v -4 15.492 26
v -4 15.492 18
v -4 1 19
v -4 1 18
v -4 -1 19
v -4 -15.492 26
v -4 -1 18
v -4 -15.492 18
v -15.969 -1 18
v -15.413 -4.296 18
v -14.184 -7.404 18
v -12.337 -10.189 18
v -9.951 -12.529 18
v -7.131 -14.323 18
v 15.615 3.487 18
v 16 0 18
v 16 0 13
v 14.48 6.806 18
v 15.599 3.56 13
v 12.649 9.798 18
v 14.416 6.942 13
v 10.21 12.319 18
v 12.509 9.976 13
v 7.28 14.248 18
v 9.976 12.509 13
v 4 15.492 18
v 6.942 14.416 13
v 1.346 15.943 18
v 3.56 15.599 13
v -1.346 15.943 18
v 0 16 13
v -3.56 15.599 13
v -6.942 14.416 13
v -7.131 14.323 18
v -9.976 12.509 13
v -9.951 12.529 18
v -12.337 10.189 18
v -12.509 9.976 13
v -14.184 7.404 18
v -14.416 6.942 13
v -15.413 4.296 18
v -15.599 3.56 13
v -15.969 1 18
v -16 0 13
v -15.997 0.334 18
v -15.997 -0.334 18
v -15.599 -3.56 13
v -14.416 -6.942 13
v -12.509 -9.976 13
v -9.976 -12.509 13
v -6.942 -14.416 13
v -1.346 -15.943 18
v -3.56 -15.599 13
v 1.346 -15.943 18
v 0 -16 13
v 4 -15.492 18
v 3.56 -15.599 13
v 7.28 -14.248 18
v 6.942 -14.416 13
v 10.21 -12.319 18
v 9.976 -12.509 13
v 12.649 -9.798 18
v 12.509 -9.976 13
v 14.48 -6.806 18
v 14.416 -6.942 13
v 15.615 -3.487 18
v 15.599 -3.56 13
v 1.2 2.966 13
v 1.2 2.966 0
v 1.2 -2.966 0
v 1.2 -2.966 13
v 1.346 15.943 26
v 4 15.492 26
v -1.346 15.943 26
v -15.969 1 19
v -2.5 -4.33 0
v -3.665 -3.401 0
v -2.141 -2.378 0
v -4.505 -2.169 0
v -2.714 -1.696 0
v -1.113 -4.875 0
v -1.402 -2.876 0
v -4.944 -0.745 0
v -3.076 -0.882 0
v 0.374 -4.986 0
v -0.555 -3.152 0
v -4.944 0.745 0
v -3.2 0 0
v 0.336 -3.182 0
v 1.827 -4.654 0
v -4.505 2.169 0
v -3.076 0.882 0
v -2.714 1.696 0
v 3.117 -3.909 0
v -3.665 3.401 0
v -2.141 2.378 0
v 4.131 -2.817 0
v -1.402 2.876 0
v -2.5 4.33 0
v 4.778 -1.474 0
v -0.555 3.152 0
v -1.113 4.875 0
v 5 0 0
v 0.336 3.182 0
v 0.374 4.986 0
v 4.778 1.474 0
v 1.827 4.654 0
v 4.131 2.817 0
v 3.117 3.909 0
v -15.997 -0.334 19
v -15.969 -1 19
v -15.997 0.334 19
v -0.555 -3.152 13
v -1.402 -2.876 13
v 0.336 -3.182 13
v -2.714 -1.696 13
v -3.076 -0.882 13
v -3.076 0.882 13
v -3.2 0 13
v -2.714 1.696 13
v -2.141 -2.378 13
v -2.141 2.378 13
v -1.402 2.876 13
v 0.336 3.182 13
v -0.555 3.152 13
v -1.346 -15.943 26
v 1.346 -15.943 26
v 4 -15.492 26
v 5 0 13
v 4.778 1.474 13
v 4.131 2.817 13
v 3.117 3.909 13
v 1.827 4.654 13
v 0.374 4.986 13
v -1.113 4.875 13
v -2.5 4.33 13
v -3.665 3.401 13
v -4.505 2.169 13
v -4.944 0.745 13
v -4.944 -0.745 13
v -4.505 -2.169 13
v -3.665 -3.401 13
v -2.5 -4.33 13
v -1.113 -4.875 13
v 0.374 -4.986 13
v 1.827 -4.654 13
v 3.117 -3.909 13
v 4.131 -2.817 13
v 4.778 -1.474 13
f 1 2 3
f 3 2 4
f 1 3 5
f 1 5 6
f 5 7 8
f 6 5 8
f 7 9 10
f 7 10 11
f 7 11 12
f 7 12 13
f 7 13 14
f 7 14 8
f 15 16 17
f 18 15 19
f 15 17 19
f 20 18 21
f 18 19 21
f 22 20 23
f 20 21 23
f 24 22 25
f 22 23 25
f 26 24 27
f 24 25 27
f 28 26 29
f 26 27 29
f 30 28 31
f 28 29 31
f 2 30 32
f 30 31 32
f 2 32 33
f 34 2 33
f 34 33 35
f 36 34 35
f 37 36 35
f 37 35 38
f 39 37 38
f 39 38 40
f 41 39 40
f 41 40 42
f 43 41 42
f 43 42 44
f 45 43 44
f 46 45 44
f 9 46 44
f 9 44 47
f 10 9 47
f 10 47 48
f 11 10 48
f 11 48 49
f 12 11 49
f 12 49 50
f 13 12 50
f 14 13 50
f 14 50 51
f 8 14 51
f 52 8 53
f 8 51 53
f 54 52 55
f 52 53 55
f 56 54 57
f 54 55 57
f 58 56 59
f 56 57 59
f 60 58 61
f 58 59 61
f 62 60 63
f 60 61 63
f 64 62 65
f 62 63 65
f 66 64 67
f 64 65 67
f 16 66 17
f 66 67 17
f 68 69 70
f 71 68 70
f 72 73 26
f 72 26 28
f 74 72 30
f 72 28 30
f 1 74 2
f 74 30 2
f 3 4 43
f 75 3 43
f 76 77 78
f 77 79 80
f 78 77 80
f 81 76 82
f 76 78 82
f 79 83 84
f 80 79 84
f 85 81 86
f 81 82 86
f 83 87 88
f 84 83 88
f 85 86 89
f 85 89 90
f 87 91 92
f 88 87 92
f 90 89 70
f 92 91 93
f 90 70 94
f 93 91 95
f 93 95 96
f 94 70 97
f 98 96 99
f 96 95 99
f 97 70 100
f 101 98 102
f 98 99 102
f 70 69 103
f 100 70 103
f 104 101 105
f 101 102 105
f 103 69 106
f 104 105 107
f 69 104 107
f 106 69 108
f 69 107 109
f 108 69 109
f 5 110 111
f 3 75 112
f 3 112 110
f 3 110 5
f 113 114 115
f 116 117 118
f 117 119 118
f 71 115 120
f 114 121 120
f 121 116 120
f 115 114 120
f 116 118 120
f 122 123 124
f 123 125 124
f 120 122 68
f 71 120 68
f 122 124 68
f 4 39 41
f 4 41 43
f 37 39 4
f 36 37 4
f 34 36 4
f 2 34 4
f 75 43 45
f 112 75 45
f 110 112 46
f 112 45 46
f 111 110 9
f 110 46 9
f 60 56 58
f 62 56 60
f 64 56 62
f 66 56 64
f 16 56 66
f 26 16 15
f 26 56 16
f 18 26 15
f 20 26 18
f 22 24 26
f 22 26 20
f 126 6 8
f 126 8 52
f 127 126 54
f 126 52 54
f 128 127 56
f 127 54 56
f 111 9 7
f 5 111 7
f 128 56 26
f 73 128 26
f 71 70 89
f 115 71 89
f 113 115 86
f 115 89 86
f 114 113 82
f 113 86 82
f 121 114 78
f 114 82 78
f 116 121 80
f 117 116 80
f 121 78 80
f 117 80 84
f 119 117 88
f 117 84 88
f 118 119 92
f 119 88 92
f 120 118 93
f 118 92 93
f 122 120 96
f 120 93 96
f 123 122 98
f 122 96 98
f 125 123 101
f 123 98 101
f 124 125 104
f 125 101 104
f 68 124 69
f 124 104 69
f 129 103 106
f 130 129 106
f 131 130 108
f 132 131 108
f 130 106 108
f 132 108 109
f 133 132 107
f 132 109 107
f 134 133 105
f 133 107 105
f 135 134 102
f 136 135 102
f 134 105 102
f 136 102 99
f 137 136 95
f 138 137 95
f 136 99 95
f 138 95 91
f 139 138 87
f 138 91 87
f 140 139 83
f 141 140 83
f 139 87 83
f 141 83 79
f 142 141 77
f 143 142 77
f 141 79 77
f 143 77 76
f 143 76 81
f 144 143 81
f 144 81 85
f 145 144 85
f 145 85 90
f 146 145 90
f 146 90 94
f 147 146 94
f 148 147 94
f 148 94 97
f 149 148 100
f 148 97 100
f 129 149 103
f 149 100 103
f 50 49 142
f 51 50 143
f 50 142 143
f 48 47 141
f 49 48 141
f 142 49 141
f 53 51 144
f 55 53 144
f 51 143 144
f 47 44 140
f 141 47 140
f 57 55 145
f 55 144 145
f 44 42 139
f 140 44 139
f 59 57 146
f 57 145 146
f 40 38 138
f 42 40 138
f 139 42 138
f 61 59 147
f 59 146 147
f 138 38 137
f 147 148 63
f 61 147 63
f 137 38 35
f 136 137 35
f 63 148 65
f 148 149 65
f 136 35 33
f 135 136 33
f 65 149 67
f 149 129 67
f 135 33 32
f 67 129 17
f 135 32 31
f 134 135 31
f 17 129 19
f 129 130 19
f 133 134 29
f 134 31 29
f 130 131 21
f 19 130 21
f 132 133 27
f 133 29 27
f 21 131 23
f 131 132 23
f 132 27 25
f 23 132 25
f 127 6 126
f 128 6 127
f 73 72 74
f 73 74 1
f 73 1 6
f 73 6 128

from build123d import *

# Parameters (mm, degrees)
F0_R     = 5
F1_DEPTH = 13
F2_R     = 16
F2_R_2   = 5
F3_DEPTH = 5
F5_DEPTH = 8
F7_DEPTH = 1


with BuildPart() as f1:
    # F0 (on Top) → F1 (new body)
    with BuildSketch(Plane.XY):
        Circle(F0_R)
        with BuildLine():
            ThreePointArc((1.2, -2.9664793948), (-3.2, 0), (1.2, 2.9664793948))
            Line((1.2, 2.9664793948), (1.2, -2.9664793948))
        make_face(mode=Mode.SUBTRACT)
    extrude(amount=F1_DEPTH)

    # F2 (on face) → F3 (join)
    with BuildSketch(Plane.XY.offset(13)):
        Circle(F2_R)
        Circle(F2_R_2, mode=Mode.SUBTRACT)
        Circle(F2_R_2)
        with BuildLine():
            Line((1.2, 2.9664793948), (1.2, -2.9664793948))
            ThreePointArc((1.2, -2.9664793948), (-3.2, 0), (1.2, 2.9664793948))
        make_face(mode=Mode.SUBTRACT)
        with BuildLine():
            ThreePointArc((1.2, 2.9664793948), (-3.2, 0), (1.2, -2.9664793948))
            Line((1.2, -2.9664793948), (1.2, 2.9664793948))
        make_face()
    extrude(amount=F3_DEPTH)

    # F4 (on face) → F5 (join)
    with BuildSketch(Plane.XY.offset(18)):
        with BuildLine():
            ThreePointArc((4, 15.4919333848), (0, 16), (-4, 15.4919333848))
            Line((-4, 15.4919333848), (-4, -15.4919333848))
            ThreePointArc((-4, -15.4919333848), (0, -16), (4, -15.4919333848))
            Line((4, -15.4919333848), (4, 15.4919333848))
        make_face()
    extrude(amount=F5_DEPTH)

    # F6 (on face) → F7 (join)
    with BuildSketch(Plane.XY.offset(18)):
        with BuildLine():
            Line((-4, 1), (-15.9687194227, 1))
            ThreePointArc((-15.9687194227, 1), (-16, 0), (-15.9687194227, -1))
            Line((-15.9687194227, -1), (-4, -1))
            Line((-4, -1), (-4, 1))
        make_face()
    extrude(amount=F7_DEPTH)


solid = f1.part
